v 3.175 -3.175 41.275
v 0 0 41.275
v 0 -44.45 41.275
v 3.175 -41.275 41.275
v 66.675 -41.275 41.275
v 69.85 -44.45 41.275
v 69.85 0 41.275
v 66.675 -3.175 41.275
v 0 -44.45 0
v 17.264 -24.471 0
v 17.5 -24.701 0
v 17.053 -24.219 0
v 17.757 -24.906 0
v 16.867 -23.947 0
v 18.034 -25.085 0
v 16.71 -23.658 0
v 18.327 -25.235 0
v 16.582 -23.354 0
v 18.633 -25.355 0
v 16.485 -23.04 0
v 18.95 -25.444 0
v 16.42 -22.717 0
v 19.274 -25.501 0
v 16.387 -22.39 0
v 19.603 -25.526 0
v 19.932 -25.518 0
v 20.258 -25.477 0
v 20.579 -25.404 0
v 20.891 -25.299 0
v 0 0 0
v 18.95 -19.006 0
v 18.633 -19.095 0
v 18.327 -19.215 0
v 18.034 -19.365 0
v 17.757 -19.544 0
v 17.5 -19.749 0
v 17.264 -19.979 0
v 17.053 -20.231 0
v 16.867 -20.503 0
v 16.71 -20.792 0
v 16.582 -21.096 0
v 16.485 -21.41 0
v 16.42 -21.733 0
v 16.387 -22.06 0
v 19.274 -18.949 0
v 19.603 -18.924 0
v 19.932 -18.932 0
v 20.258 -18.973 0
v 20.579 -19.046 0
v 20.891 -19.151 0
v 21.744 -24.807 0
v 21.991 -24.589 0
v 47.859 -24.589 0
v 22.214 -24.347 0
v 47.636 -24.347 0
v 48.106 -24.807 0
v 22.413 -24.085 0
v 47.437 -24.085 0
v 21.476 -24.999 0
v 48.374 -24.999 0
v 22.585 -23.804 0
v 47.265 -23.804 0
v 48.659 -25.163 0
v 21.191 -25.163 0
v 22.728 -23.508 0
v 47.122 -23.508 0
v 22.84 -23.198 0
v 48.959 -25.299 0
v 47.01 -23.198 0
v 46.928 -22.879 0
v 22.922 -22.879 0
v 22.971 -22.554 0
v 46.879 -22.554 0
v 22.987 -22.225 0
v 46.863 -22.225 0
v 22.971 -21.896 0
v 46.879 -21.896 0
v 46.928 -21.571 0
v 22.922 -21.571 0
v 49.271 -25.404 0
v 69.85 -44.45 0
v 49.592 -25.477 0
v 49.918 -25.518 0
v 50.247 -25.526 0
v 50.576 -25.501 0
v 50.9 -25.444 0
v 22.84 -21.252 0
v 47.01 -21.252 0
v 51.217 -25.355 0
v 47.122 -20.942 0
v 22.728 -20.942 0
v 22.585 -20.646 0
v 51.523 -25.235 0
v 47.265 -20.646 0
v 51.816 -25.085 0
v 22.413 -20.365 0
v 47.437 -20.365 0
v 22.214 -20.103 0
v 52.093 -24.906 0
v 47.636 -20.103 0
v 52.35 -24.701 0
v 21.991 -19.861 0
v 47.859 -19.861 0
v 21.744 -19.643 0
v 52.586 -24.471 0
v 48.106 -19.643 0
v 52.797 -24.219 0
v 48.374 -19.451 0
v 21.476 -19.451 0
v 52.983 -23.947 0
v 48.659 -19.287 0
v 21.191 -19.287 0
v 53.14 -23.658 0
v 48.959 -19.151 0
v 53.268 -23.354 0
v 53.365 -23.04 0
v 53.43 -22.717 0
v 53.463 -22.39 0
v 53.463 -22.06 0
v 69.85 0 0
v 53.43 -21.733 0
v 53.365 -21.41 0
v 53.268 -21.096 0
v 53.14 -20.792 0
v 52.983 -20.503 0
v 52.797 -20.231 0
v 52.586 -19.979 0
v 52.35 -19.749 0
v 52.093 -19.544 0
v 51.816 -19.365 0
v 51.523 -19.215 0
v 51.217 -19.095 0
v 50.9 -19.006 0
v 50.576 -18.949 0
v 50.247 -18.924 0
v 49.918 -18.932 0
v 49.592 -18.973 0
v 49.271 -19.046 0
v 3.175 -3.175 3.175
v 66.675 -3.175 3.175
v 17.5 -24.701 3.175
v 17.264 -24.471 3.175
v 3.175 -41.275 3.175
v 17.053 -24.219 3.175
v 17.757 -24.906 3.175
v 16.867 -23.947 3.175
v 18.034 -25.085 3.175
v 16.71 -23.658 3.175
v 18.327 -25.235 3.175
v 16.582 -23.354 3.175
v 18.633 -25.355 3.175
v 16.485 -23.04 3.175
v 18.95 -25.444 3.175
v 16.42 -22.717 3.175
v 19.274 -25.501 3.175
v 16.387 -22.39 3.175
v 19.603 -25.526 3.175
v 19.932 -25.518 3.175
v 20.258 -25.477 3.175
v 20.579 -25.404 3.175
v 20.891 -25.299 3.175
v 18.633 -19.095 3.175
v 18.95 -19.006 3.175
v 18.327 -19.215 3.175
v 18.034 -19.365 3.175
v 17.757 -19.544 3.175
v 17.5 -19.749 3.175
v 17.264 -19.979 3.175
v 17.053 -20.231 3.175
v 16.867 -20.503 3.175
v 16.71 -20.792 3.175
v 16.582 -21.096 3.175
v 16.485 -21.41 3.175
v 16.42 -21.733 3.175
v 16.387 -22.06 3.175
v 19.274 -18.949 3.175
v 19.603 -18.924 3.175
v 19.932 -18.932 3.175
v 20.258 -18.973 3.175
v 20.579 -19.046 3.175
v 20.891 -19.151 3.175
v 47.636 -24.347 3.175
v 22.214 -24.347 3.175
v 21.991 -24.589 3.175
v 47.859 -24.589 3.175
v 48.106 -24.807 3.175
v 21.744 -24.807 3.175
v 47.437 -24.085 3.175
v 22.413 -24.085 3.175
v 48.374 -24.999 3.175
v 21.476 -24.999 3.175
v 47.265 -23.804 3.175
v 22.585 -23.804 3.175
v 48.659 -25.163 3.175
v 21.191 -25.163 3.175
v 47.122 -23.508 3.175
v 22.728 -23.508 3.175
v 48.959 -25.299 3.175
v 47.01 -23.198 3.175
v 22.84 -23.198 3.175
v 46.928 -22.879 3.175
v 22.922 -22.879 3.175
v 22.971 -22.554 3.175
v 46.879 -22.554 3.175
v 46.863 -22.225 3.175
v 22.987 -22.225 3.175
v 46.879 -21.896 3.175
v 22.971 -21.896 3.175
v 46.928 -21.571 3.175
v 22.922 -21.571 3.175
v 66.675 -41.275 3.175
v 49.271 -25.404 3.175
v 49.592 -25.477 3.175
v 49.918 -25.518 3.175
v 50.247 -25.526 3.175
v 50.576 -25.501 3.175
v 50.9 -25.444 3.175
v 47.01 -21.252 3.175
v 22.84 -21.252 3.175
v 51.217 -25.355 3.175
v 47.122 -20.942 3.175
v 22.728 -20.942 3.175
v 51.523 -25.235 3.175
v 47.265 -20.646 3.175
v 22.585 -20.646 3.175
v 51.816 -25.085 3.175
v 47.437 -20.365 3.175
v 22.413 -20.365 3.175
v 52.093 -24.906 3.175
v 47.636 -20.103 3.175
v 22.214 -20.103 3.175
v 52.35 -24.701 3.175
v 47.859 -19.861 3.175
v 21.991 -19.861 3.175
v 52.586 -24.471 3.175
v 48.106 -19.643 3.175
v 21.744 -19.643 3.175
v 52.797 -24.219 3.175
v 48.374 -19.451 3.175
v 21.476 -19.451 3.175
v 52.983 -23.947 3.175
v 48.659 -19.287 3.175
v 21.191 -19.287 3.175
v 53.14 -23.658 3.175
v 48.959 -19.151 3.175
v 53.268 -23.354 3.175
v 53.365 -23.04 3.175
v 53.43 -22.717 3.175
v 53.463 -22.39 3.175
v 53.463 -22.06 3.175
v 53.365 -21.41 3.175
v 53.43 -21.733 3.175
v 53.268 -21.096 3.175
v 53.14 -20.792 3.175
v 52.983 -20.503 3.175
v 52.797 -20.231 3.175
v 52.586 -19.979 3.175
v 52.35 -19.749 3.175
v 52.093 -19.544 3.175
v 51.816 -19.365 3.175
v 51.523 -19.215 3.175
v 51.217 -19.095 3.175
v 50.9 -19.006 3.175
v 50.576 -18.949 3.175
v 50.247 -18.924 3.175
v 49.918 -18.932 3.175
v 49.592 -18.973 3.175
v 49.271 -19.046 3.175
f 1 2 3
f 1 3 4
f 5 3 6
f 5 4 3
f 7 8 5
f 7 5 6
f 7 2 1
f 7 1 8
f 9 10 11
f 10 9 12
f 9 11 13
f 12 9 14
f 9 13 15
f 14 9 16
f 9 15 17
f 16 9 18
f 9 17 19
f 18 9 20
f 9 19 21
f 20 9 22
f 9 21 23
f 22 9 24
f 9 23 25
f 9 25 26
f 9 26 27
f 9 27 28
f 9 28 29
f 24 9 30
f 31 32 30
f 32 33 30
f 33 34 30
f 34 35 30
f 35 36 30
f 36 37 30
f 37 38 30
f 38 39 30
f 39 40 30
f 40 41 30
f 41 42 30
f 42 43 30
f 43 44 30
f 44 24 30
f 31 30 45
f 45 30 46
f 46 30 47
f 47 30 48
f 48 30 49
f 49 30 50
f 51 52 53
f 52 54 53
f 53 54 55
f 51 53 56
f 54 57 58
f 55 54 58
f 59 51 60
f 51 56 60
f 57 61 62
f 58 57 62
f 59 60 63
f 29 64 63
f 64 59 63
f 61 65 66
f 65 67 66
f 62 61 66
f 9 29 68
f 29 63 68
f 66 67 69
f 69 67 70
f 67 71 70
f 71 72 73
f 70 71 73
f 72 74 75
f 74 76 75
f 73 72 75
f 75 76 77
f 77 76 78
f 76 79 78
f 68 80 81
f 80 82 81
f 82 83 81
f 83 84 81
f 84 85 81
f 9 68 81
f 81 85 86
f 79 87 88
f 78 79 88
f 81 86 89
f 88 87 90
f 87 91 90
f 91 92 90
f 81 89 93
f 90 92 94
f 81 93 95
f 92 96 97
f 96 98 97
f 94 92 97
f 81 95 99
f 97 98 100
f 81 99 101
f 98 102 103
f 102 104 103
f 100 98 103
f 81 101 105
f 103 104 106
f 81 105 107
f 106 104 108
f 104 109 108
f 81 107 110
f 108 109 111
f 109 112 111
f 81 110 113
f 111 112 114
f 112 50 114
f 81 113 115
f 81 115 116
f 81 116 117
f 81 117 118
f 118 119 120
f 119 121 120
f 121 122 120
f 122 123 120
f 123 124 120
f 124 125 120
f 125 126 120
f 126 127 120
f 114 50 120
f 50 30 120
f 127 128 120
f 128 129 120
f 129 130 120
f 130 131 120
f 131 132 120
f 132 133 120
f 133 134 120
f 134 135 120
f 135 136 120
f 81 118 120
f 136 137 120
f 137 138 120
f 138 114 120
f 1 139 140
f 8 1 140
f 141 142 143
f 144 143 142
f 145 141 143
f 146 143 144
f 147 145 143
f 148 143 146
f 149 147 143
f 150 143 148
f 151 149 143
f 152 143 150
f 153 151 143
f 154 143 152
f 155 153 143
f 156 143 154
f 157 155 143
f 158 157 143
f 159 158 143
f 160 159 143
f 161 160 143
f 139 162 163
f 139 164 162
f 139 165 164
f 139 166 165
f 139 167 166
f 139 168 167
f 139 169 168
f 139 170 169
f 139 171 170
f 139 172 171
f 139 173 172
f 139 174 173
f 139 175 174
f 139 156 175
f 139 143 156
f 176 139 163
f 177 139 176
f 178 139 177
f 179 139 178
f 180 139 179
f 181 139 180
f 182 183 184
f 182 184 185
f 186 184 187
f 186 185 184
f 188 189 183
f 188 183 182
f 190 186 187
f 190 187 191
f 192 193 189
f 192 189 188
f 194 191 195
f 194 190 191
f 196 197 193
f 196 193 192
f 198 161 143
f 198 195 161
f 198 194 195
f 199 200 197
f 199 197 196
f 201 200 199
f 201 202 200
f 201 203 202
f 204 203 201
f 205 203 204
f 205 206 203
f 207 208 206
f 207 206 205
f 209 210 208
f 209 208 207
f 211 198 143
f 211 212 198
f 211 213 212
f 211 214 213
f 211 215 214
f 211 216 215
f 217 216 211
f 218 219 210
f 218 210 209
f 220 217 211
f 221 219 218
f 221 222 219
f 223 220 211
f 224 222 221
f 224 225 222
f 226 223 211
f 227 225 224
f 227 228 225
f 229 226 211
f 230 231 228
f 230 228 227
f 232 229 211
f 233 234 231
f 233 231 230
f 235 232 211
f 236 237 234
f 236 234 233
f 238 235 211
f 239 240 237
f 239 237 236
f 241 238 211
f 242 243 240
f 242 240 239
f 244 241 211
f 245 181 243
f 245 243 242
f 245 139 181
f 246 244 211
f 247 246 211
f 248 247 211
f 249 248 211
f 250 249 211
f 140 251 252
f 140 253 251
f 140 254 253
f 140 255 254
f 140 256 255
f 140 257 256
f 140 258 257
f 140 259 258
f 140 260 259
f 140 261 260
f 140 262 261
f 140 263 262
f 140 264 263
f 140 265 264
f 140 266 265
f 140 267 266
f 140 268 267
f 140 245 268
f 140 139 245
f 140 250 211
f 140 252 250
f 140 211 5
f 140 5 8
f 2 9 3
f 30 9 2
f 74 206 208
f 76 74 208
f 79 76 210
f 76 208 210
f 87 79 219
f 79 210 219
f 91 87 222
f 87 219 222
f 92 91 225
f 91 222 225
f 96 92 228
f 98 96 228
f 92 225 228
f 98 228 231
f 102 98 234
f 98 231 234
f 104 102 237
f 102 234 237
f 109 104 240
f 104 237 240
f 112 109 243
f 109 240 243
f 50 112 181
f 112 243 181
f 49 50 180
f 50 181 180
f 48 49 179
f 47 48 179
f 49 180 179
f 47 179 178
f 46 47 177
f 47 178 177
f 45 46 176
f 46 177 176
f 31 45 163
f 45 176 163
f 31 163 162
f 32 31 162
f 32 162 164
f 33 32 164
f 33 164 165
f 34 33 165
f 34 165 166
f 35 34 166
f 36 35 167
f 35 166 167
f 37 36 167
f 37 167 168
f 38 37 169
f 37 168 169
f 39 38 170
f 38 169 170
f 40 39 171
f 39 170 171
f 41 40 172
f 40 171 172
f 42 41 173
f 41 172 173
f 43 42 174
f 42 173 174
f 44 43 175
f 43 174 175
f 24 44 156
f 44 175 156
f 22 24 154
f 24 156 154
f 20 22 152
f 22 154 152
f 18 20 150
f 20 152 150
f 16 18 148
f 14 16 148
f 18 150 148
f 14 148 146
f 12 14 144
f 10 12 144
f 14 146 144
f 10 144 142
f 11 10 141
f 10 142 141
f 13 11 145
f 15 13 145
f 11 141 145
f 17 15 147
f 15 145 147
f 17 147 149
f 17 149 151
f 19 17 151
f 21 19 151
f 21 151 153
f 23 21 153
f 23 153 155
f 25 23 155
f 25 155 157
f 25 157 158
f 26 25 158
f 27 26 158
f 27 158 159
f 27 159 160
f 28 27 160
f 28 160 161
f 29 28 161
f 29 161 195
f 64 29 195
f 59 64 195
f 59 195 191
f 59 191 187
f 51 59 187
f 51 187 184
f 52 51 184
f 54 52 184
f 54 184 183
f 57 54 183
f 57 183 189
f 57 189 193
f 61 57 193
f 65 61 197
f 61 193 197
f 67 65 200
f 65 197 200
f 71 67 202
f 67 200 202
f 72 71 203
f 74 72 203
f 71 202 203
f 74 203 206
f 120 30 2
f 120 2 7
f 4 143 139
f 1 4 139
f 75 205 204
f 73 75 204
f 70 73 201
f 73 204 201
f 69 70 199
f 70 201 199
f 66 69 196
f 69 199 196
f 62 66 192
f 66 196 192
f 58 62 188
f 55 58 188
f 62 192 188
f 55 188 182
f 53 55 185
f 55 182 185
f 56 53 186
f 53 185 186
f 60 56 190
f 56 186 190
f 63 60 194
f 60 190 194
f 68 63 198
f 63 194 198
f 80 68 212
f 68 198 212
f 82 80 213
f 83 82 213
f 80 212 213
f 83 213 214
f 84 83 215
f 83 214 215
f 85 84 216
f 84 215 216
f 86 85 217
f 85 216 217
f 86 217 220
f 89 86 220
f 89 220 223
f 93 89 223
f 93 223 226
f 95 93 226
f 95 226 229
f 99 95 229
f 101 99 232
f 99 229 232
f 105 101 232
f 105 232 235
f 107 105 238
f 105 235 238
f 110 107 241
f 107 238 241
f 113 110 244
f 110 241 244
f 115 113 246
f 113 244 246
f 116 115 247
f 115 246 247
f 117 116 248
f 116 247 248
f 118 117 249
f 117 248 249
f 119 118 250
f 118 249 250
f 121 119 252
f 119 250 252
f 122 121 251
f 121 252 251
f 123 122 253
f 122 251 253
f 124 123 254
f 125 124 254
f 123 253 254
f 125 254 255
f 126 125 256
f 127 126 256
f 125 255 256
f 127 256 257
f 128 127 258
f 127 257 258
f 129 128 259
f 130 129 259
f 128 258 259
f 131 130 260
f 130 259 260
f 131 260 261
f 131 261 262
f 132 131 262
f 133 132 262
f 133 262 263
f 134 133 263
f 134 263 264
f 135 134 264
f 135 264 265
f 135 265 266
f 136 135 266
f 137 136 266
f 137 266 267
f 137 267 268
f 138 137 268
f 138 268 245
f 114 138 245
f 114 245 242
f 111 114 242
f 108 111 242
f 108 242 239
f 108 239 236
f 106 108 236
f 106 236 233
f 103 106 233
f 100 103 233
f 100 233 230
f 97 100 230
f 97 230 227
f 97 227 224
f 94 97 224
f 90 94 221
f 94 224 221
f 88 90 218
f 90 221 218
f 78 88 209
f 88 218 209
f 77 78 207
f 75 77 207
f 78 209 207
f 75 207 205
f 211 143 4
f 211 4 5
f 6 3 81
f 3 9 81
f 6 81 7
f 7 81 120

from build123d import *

# Parameters (mm, degrees)
F0_W     = 69.85
F0_H     = 44.45
F1_DEPTH = 3.175
F3_DEPTH = 3.175
F4_W     = 69.85
F4_H     = 44.45
F4_W_2   = 63.5
F4_H_2   = 38.1
F5_DEPTH = 38.1


with BuildPart() as f1:
    # F0 (on Top) → F1 (new body)
    with BuildSketch(Plane.XY):
        with Locations((34.925, -22.225)):
            Rectangle(F0_W, F0_H)
    extrude(amount=F1_DEPTH)

    # F2 (on face) → F3 (cut, through all)
    with BuildSketch(Plane.XY.offset(3.175)):
        with BuildLine():
            ThreePointArc((16.383, -22.225), (19.685, -25.527), (22.987, -22.225))
            Line((22.987, -22.225), (16.383, -22.225))
        make_face()
        with BuildLine():
            Line((16.383, -22.225), (22.987, -22.225))
            ThreePointArc((22.987, -22.225), (19.685, -18.923), (16.383, -22.225))
        make_face()
        with BuildLine():
            ThreePointArc((53.467, -22.225), (50.165, -18.923), (46.863, -22.225))
            Line((46.863, -22.225), (53.467, -22.225))
        make_face()
        with BuildLine():
            Line((53.467, -22.225), (46.863, -22.225))
            ThreePointArc((46.863, -22.225), (50.165, -25.527), (53.467, -22.225))
        make_face()
    extrude(amount=-F3_DEPTH, mode=Mode.SUBTRACT)

    # F4 (on face) → F5 (join)
    with BuildSketch(Plane.XY.offset(3.175)):
        with Locations((34.925, -22.225)):
            Rectangle(F4_W, F4_H)
        with Locations((34.925, -22.225)):
            Rectangle(F4_W_2, F4_H_2, mode=Mode.SUBTRACT)
    extrude(amount=F5_DEPTH)


solid = f1.part
